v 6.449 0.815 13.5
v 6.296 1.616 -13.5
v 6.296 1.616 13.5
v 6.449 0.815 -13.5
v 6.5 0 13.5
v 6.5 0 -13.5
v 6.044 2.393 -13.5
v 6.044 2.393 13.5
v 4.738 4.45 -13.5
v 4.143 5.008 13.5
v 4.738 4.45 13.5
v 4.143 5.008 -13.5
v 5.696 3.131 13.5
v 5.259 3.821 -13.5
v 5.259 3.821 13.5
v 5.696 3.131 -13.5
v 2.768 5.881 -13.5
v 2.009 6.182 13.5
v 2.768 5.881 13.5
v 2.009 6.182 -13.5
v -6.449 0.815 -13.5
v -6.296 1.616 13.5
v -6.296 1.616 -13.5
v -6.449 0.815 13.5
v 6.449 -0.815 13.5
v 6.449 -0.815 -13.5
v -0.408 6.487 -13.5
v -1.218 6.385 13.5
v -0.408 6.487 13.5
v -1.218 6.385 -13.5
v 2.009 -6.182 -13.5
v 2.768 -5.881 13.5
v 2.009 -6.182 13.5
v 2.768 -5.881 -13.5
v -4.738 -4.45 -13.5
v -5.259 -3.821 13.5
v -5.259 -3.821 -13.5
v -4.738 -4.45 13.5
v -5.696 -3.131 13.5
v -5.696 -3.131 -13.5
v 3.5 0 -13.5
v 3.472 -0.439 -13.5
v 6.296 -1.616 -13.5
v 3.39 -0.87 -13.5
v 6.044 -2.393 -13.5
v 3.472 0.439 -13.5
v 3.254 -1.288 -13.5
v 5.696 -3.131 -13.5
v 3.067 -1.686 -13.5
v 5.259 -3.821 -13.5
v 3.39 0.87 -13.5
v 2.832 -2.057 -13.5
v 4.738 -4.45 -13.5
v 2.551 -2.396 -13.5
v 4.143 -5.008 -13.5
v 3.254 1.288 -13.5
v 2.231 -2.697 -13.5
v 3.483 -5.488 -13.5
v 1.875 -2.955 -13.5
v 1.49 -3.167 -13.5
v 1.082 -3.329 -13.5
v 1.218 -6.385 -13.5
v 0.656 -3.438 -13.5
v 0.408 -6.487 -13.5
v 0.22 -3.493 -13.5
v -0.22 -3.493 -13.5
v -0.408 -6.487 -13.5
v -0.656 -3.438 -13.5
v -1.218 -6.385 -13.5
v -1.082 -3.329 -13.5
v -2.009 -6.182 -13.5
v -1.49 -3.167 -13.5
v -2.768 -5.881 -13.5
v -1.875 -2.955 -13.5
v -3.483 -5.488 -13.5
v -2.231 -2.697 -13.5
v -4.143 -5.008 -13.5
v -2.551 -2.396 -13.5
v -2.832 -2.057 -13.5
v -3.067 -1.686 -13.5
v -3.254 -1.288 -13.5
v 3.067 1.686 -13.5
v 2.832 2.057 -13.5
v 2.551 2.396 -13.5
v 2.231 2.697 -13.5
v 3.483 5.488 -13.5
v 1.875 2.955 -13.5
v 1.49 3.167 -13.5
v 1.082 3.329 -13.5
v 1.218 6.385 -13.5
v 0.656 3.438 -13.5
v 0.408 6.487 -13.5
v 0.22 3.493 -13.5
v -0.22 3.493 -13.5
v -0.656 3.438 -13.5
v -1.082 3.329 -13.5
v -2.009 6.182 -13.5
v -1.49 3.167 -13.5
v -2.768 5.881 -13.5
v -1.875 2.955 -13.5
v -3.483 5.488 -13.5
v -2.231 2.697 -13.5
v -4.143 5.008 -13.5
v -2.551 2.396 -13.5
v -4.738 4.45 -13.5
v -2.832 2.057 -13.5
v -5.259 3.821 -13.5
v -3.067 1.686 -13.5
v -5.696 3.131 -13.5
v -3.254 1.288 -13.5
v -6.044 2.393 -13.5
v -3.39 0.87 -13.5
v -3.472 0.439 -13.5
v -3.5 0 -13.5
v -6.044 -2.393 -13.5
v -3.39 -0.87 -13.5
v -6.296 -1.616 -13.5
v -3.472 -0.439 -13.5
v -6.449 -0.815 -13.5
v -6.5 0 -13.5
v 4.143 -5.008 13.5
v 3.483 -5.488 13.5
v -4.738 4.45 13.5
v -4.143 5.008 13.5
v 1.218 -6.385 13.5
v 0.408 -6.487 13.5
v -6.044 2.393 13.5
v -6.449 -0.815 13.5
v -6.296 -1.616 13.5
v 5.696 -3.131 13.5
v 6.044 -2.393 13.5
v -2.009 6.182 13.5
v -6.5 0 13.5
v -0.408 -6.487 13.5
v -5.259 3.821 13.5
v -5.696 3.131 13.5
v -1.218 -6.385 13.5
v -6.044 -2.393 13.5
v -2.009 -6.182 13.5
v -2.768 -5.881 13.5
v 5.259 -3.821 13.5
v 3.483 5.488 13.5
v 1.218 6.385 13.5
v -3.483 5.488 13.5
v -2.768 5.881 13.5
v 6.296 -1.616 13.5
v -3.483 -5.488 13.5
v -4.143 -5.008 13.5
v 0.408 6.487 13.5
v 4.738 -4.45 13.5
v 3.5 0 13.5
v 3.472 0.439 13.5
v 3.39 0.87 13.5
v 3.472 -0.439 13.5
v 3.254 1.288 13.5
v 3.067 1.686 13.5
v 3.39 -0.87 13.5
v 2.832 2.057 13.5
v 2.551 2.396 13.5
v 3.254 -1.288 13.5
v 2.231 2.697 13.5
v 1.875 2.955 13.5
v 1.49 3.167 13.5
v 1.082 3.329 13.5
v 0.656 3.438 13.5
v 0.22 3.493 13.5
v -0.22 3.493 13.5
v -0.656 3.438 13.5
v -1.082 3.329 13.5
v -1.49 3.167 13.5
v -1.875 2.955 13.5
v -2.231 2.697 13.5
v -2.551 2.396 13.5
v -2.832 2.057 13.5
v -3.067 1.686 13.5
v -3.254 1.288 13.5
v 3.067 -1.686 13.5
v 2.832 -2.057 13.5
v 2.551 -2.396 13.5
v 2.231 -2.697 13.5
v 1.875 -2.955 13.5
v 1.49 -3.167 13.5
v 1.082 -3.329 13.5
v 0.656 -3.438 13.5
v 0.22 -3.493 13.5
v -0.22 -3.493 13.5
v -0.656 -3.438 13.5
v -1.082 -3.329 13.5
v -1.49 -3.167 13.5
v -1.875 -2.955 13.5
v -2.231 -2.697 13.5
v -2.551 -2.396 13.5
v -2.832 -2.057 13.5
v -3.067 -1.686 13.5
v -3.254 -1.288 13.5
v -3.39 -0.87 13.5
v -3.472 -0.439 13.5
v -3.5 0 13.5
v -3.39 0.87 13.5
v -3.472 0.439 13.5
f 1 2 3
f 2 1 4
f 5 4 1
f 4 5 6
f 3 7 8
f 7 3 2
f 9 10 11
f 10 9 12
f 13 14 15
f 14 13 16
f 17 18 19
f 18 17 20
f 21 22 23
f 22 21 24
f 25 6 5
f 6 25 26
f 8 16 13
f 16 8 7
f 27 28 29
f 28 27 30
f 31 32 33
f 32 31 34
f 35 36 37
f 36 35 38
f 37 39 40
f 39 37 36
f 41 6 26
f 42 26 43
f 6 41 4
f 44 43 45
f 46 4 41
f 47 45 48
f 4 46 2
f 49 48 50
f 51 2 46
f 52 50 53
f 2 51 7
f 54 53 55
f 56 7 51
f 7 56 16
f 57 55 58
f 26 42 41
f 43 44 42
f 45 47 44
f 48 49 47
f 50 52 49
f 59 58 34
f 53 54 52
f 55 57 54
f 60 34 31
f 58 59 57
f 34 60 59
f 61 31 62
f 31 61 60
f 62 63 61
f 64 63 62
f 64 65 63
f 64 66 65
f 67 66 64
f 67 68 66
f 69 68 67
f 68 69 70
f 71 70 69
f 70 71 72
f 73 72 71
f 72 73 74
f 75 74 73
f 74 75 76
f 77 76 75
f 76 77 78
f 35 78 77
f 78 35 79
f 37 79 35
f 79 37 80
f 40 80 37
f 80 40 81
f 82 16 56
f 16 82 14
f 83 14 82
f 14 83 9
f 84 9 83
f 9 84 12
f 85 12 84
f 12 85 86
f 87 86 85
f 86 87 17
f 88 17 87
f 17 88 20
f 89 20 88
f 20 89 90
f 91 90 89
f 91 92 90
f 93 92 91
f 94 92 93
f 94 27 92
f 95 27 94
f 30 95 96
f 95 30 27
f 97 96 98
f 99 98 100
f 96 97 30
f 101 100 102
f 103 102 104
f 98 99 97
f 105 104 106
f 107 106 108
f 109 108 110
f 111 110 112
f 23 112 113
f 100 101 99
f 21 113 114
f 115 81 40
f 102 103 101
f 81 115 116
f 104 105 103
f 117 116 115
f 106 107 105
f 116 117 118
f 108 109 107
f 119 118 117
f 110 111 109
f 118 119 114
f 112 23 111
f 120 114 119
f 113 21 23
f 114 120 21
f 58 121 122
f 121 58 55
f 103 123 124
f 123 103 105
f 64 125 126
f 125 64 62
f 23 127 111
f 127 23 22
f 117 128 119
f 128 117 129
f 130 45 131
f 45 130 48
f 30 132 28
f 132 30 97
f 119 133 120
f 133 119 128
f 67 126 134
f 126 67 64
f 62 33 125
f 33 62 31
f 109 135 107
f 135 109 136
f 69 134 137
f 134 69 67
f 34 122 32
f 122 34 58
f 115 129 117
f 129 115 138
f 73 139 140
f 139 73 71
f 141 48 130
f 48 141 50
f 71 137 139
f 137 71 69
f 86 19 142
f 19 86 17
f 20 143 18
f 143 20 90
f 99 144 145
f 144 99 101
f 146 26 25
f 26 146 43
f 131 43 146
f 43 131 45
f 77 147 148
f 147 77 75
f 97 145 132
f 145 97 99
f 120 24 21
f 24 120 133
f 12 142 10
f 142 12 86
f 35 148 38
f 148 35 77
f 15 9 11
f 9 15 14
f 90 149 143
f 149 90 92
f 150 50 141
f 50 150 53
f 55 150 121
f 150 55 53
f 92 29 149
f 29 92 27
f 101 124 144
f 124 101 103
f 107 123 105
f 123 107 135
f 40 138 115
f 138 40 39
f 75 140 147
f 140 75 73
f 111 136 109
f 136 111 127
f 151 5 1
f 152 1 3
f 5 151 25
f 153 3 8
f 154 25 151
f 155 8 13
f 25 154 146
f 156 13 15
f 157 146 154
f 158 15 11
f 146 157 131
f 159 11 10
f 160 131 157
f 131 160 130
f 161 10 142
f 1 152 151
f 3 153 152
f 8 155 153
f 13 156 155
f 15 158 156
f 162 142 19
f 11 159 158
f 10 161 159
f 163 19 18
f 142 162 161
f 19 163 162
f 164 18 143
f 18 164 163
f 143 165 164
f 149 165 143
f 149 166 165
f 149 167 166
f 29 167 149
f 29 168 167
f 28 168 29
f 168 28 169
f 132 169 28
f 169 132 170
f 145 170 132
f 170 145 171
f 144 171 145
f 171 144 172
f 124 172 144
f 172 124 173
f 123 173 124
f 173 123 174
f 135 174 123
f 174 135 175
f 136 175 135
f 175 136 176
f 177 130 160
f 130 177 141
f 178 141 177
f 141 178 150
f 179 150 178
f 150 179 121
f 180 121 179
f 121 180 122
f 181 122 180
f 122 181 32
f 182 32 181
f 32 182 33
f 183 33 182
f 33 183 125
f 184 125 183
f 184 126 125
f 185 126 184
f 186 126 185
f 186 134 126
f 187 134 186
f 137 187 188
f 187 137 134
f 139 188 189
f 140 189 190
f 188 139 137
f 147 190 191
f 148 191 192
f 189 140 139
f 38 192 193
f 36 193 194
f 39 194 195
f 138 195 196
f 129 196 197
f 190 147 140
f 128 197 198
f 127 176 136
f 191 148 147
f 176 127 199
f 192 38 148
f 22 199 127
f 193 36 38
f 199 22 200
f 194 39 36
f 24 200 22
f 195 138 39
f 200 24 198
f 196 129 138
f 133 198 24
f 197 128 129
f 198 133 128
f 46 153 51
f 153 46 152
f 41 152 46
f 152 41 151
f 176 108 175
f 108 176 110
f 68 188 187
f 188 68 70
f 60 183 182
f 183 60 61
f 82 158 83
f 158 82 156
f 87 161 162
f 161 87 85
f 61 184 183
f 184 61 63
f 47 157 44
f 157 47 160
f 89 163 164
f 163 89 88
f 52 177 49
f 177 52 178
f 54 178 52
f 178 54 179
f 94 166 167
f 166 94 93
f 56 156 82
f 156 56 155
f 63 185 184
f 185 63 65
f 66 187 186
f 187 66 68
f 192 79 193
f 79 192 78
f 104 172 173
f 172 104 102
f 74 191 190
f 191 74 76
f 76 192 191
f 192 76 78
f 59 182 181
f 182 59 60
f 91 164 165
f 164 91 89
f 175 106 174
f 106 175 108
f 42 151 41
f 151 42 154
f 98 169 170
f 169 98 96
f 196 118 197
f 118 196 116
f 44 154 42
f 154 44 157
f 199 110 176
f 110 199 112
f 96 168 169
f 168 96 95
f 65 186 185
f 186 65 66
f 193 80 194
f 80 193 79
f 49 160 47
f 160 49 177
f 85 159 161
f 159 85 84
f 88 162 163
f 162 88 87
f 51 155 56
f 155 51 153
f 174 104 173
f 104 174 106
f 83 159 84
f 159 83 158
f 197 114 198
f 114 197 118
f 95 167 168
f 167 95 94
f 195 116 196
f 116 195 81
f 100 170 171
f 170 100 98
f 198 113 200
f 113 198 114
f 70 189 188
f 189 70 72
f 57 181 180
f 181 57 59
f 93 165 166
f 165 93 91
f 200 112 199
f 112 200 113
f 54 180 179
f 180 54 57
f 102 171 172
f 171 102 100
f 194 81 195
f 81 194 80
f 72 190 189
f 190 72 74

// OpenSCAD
$fn = 50;


difference() {
	union() {
		translate(v = [0, 0, -13.5000000000]) {
			cylinder(h = 27, r = 6.5000000000);
		}
	}
	union() {
		translate(v = [0, 0, -100.0000000000]) {
			cylinder(h = 200, r = 3.5000000000);
		}
	}
}
